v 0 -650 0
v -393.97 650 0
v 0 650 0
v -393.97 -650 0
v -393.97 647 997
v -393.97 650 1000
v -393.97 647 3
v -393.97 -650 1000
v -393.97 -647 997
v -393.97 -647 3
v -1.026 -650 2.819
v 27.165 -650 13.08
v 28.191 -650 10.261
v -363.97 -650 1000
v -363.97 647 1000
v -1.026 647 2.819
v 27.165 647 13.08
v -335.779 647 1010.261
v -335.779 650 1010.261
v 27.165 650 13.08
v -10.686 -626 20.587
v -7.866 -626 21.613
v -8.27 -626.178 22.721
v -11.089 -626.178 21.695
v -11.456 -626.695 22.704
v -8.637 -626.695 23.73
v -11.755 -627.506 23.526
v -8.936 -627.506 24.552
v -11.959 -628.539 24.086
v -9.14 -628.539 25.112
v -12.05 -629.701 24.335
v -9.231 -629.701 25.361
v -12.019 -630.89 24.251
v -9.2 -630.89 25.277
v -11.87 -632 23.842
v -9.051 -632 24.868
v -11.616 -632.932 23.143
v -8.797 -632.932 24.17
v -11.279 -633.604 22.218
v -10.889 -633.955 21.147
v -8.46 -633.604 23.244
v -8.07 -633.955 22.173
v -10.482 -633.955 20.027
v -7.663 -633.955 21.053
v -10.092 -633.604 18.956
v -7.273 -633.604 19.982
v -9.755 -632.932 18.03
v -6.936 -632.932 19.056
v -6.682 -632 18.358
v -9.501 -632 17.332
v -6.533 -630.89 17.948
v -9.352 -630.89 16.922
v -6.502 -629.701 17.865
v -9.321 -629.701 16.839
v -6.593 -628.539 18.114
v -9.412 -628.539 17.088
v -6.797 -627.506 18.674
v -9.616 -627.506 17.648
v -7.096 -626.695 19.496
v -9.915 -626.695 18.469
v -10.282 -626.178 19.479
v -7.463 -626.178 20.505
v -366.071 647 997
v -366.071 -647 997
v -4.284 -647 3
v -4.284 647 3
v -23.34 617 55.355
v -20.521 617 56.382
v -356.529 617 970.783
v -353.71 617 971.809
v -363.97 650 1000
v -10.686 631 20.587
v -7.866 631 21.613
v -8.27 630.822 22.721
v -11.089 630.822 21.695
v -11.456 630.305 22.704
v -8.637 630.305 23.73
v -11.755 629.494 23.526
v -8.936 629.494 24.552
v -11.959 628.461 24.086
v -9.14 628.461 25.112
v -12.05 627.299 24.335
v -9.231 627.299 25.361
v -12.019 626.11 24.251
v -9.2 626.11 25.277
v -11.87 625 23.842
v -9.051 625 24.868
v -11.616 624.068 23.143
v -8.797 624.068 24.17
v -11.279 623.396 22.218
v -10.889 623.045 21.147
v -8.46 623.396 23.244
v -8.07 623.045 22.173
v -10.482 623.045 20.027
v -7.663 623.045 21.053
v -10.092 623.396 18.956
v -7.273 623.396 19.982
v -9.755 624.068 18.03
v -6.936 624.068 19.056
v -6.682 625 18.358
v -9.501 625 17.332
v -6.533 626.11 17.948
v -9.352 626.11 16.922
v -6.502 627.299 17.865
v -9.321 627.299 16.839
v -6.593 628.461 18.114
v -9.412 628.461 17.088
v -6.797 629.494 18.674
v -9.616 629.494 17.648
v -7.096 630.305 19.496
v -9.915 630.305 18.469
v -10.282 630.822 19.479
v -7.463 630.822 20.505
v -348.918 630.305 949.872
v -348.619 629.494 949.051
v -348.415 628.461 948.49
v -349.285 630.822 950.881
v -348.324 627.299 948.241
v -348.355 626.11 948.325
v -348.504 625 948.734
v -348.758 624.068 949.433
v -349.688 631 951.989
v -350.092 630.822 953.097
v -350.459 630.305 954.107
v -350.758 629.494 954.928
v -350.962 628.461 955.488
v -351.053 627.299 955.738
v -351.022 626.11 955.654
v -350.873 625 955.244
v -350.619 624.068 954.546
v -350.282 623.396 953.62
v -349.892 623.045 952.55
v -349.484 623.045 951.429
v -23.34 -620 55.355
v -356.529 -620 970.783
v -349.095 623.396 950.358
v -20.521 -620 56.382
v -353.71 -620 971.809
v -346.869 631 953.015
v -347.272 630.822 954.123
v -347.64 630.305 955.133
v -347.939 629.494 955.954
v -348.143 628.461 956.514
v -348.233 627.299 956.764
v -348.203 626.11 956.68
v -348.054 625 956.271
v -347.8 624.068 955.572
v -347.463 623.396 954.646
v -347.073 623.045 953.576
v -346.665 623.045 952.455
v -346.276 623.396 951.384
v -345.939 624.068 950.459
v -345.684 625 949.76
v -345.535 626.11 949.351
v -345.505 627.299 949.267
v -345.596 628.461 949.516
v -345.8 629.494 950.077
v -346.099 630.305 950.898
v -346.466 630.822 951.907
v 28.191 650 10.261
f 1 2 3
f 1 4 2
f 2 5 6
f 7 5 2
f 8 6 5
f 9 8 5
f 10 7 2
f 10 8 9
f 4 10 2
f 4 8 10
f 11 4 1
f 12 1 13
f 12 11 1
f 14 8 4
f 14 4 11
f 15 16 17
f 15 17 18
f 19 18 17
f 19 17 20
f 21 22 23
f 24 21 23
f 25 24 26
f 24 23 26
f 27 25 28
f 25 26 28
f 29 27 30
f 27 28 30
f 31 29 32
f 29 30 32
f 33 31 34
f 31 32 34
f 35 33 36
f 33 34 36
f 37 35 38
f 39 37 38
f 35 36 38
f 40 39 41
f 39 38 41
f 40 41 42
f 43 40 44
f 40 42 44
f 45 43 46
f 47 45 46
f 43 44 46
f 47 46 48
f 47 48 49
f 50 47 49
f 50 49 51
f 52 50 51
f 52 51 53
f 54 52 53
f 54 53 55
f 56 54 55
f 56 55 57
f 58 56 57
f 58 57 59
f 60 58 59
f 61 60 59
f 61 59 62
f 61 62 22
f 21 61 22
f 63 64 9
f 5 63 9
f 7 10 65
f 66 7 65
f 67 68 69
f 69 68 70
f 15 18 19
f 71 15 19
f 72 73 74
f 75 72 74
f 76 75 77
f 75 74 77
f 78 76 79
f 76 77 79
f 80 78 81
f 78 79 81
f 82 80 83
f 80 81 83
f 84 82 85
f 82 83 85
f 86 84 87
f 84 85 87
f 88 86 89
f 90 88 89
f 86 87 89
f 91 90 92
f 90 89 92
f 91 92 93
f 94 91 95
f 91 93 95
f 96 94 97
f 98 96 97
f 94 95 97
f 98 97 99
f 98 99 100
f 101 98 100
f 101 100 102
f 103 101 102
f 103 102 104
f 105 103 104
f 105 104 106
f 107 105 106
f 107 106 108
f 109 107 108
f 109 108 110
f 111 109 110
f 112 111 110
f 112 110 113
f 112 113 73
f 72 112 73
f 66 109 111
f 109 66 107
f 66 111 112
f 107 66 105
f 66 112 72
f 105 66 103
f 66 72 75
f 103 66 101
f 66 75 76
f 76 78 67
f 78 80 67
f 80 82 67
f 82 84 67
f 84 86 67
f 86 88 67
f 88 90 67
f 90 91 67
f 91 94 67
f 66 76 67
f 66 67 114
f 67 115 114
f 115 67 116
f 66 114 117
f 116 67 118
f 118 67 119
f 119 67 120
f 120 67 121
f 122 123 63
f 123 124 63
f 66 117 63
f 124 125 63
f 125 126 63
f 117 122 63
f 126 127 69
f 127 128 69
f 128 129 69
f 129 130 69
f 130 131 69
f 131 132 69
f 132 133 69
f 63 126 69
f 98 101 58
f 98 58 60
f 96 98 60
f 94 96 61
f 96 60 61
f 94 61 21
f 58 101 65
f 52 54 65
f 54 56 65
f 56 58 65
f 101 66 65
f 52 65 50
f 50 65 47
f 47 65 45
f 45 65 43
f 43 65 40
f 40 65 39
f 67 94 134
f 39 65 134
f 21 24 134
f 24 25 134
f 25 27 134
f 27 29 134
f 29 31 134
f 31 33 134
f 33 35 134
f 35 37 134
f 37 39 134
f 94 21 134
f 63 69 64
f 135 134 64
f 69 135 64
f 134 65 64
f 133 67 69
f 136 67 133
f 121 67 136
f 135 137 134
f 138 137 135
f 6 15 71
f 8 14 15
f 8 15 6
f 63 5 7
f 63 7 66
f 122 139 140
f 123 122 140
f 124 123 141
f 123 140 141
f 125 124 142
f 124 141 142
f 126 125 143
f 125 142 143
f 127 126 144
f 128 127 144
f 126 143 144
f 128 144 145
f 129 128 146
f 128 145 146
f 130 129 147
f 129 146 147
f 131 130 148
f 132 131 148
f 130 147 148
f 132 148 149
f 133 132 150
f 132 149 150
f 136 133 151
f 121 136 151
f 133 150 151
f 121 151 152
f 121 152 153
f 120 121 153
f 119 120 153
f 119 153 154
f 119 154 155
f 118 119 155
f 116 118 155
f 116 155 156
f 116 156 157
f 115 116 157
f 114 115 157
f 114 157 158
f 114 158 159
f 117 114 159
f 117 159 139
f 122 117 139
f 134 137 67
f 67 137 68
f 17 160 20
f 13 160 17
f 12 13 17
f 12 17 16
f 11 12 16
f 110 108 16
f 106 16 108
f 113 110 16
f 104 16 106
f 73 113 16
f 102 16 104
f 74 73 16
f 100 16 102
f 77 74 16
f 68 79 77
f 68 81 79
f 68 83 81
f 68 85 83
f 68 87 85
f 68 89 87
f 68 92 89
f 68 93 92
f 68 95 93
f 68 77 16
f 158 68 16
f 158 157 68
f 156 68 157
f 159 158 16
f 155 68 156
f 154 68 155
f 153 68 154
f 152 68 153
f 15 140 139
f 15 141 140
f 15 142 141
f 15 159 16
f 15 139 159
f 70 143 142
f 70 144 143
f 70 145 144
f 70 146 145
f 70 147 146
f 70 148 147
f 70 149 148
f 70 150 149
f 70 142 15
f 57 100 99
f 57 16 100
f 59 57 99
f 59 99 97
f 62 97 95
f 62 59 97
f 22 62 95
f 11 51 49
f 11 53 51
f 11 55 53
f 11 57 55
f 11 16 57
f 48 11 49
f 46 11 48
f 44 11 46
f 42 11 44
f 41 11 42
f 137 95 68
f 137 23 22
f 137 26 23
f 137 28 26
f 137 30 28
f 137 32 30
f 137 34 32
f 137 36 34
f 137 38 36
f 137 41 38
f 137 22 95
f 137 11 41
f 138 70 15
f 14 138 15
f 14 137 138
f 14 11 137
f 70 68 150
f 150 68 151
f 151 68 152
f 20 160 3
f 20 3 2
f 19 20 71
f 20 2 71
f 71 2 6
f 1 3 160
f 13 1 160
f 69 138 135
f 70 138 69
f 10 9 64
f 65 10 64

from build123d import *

# Parameters (mm, degrees)
F1_DEPTH = 650
F2_T     = -3
F3_W     = 1237
F3_H     = 974.1777724759
F4_DEPTH = 3
F5_W     = 3
F5_H     = 1061.1777724759
F6_DEPTH = 30
F7_R     = 4
F8_DEPTH = 25


with BuildPart() as f1:
    # F0 (on Front) → F1 (new body, symmetric)
    with BuildSketch(Plane.XZ):
        Polygon((-393.9702342662, 0), (0, 0), (28.1907786236, 10.2606042998), (27.1647181936, 13.0796821621), (-1.02606043, 2.8190778624), (-363.9702342662, 1000), (-393.9702342662, 1000), align=None)
    extrude(amount=F1_DEPTH, both=True)

    # F2
    f2_openings = [f1.faces().sort_by_distance(p)[0] for p in [
        (-393.970234, 0, 500),
    ]]
    offset(amount=F2_T, openings=f2_openings)

    # F3 (on face) → F4 (cut)
    with BuildSketch(Plane(origin=(0, 0, 0), x_dir=(0, 1, 0), z_dir=(0.9396926208, 0, 0.3420201433))):
        with Locations((-1.5, 547.088886238)):
            Rectangle(F3_W, F3_H)
    extrude(amount=-F4_DEPTH, mode=Mode.SUBTRACT)

    # F5 (on face) → F6 (join)
    with BuildSketch(Plane(origin=(0, 0, 0), x_dir=(0, 1, 0), z_dir=(0.9396926208, 0, 0.3420201433))):
        with Locations((648.5, 533.588886238)):
            Rectangle(F5_W, F5_H)
    extrude(amount=F6_DEPTH)

    # F7 (on face) → F8 (cut)
    with BuildSketch(Plane(origin=(0, 0, 0), x_dir=(0, 1, 0), z_dir=(0.9396926208, 0, 0.3420201433))):
        with Locations((627, 23)):
            Circle(F7_R)
        with Locations((-630, 23)):
            Circle(F7_R)
        with Locations((627, 1014.1777724759)):
            Circle(F7_R)
    extrude(amount=-F8_DEPTH, mode=Mode.SUBTRACT)


solid = f1.part
